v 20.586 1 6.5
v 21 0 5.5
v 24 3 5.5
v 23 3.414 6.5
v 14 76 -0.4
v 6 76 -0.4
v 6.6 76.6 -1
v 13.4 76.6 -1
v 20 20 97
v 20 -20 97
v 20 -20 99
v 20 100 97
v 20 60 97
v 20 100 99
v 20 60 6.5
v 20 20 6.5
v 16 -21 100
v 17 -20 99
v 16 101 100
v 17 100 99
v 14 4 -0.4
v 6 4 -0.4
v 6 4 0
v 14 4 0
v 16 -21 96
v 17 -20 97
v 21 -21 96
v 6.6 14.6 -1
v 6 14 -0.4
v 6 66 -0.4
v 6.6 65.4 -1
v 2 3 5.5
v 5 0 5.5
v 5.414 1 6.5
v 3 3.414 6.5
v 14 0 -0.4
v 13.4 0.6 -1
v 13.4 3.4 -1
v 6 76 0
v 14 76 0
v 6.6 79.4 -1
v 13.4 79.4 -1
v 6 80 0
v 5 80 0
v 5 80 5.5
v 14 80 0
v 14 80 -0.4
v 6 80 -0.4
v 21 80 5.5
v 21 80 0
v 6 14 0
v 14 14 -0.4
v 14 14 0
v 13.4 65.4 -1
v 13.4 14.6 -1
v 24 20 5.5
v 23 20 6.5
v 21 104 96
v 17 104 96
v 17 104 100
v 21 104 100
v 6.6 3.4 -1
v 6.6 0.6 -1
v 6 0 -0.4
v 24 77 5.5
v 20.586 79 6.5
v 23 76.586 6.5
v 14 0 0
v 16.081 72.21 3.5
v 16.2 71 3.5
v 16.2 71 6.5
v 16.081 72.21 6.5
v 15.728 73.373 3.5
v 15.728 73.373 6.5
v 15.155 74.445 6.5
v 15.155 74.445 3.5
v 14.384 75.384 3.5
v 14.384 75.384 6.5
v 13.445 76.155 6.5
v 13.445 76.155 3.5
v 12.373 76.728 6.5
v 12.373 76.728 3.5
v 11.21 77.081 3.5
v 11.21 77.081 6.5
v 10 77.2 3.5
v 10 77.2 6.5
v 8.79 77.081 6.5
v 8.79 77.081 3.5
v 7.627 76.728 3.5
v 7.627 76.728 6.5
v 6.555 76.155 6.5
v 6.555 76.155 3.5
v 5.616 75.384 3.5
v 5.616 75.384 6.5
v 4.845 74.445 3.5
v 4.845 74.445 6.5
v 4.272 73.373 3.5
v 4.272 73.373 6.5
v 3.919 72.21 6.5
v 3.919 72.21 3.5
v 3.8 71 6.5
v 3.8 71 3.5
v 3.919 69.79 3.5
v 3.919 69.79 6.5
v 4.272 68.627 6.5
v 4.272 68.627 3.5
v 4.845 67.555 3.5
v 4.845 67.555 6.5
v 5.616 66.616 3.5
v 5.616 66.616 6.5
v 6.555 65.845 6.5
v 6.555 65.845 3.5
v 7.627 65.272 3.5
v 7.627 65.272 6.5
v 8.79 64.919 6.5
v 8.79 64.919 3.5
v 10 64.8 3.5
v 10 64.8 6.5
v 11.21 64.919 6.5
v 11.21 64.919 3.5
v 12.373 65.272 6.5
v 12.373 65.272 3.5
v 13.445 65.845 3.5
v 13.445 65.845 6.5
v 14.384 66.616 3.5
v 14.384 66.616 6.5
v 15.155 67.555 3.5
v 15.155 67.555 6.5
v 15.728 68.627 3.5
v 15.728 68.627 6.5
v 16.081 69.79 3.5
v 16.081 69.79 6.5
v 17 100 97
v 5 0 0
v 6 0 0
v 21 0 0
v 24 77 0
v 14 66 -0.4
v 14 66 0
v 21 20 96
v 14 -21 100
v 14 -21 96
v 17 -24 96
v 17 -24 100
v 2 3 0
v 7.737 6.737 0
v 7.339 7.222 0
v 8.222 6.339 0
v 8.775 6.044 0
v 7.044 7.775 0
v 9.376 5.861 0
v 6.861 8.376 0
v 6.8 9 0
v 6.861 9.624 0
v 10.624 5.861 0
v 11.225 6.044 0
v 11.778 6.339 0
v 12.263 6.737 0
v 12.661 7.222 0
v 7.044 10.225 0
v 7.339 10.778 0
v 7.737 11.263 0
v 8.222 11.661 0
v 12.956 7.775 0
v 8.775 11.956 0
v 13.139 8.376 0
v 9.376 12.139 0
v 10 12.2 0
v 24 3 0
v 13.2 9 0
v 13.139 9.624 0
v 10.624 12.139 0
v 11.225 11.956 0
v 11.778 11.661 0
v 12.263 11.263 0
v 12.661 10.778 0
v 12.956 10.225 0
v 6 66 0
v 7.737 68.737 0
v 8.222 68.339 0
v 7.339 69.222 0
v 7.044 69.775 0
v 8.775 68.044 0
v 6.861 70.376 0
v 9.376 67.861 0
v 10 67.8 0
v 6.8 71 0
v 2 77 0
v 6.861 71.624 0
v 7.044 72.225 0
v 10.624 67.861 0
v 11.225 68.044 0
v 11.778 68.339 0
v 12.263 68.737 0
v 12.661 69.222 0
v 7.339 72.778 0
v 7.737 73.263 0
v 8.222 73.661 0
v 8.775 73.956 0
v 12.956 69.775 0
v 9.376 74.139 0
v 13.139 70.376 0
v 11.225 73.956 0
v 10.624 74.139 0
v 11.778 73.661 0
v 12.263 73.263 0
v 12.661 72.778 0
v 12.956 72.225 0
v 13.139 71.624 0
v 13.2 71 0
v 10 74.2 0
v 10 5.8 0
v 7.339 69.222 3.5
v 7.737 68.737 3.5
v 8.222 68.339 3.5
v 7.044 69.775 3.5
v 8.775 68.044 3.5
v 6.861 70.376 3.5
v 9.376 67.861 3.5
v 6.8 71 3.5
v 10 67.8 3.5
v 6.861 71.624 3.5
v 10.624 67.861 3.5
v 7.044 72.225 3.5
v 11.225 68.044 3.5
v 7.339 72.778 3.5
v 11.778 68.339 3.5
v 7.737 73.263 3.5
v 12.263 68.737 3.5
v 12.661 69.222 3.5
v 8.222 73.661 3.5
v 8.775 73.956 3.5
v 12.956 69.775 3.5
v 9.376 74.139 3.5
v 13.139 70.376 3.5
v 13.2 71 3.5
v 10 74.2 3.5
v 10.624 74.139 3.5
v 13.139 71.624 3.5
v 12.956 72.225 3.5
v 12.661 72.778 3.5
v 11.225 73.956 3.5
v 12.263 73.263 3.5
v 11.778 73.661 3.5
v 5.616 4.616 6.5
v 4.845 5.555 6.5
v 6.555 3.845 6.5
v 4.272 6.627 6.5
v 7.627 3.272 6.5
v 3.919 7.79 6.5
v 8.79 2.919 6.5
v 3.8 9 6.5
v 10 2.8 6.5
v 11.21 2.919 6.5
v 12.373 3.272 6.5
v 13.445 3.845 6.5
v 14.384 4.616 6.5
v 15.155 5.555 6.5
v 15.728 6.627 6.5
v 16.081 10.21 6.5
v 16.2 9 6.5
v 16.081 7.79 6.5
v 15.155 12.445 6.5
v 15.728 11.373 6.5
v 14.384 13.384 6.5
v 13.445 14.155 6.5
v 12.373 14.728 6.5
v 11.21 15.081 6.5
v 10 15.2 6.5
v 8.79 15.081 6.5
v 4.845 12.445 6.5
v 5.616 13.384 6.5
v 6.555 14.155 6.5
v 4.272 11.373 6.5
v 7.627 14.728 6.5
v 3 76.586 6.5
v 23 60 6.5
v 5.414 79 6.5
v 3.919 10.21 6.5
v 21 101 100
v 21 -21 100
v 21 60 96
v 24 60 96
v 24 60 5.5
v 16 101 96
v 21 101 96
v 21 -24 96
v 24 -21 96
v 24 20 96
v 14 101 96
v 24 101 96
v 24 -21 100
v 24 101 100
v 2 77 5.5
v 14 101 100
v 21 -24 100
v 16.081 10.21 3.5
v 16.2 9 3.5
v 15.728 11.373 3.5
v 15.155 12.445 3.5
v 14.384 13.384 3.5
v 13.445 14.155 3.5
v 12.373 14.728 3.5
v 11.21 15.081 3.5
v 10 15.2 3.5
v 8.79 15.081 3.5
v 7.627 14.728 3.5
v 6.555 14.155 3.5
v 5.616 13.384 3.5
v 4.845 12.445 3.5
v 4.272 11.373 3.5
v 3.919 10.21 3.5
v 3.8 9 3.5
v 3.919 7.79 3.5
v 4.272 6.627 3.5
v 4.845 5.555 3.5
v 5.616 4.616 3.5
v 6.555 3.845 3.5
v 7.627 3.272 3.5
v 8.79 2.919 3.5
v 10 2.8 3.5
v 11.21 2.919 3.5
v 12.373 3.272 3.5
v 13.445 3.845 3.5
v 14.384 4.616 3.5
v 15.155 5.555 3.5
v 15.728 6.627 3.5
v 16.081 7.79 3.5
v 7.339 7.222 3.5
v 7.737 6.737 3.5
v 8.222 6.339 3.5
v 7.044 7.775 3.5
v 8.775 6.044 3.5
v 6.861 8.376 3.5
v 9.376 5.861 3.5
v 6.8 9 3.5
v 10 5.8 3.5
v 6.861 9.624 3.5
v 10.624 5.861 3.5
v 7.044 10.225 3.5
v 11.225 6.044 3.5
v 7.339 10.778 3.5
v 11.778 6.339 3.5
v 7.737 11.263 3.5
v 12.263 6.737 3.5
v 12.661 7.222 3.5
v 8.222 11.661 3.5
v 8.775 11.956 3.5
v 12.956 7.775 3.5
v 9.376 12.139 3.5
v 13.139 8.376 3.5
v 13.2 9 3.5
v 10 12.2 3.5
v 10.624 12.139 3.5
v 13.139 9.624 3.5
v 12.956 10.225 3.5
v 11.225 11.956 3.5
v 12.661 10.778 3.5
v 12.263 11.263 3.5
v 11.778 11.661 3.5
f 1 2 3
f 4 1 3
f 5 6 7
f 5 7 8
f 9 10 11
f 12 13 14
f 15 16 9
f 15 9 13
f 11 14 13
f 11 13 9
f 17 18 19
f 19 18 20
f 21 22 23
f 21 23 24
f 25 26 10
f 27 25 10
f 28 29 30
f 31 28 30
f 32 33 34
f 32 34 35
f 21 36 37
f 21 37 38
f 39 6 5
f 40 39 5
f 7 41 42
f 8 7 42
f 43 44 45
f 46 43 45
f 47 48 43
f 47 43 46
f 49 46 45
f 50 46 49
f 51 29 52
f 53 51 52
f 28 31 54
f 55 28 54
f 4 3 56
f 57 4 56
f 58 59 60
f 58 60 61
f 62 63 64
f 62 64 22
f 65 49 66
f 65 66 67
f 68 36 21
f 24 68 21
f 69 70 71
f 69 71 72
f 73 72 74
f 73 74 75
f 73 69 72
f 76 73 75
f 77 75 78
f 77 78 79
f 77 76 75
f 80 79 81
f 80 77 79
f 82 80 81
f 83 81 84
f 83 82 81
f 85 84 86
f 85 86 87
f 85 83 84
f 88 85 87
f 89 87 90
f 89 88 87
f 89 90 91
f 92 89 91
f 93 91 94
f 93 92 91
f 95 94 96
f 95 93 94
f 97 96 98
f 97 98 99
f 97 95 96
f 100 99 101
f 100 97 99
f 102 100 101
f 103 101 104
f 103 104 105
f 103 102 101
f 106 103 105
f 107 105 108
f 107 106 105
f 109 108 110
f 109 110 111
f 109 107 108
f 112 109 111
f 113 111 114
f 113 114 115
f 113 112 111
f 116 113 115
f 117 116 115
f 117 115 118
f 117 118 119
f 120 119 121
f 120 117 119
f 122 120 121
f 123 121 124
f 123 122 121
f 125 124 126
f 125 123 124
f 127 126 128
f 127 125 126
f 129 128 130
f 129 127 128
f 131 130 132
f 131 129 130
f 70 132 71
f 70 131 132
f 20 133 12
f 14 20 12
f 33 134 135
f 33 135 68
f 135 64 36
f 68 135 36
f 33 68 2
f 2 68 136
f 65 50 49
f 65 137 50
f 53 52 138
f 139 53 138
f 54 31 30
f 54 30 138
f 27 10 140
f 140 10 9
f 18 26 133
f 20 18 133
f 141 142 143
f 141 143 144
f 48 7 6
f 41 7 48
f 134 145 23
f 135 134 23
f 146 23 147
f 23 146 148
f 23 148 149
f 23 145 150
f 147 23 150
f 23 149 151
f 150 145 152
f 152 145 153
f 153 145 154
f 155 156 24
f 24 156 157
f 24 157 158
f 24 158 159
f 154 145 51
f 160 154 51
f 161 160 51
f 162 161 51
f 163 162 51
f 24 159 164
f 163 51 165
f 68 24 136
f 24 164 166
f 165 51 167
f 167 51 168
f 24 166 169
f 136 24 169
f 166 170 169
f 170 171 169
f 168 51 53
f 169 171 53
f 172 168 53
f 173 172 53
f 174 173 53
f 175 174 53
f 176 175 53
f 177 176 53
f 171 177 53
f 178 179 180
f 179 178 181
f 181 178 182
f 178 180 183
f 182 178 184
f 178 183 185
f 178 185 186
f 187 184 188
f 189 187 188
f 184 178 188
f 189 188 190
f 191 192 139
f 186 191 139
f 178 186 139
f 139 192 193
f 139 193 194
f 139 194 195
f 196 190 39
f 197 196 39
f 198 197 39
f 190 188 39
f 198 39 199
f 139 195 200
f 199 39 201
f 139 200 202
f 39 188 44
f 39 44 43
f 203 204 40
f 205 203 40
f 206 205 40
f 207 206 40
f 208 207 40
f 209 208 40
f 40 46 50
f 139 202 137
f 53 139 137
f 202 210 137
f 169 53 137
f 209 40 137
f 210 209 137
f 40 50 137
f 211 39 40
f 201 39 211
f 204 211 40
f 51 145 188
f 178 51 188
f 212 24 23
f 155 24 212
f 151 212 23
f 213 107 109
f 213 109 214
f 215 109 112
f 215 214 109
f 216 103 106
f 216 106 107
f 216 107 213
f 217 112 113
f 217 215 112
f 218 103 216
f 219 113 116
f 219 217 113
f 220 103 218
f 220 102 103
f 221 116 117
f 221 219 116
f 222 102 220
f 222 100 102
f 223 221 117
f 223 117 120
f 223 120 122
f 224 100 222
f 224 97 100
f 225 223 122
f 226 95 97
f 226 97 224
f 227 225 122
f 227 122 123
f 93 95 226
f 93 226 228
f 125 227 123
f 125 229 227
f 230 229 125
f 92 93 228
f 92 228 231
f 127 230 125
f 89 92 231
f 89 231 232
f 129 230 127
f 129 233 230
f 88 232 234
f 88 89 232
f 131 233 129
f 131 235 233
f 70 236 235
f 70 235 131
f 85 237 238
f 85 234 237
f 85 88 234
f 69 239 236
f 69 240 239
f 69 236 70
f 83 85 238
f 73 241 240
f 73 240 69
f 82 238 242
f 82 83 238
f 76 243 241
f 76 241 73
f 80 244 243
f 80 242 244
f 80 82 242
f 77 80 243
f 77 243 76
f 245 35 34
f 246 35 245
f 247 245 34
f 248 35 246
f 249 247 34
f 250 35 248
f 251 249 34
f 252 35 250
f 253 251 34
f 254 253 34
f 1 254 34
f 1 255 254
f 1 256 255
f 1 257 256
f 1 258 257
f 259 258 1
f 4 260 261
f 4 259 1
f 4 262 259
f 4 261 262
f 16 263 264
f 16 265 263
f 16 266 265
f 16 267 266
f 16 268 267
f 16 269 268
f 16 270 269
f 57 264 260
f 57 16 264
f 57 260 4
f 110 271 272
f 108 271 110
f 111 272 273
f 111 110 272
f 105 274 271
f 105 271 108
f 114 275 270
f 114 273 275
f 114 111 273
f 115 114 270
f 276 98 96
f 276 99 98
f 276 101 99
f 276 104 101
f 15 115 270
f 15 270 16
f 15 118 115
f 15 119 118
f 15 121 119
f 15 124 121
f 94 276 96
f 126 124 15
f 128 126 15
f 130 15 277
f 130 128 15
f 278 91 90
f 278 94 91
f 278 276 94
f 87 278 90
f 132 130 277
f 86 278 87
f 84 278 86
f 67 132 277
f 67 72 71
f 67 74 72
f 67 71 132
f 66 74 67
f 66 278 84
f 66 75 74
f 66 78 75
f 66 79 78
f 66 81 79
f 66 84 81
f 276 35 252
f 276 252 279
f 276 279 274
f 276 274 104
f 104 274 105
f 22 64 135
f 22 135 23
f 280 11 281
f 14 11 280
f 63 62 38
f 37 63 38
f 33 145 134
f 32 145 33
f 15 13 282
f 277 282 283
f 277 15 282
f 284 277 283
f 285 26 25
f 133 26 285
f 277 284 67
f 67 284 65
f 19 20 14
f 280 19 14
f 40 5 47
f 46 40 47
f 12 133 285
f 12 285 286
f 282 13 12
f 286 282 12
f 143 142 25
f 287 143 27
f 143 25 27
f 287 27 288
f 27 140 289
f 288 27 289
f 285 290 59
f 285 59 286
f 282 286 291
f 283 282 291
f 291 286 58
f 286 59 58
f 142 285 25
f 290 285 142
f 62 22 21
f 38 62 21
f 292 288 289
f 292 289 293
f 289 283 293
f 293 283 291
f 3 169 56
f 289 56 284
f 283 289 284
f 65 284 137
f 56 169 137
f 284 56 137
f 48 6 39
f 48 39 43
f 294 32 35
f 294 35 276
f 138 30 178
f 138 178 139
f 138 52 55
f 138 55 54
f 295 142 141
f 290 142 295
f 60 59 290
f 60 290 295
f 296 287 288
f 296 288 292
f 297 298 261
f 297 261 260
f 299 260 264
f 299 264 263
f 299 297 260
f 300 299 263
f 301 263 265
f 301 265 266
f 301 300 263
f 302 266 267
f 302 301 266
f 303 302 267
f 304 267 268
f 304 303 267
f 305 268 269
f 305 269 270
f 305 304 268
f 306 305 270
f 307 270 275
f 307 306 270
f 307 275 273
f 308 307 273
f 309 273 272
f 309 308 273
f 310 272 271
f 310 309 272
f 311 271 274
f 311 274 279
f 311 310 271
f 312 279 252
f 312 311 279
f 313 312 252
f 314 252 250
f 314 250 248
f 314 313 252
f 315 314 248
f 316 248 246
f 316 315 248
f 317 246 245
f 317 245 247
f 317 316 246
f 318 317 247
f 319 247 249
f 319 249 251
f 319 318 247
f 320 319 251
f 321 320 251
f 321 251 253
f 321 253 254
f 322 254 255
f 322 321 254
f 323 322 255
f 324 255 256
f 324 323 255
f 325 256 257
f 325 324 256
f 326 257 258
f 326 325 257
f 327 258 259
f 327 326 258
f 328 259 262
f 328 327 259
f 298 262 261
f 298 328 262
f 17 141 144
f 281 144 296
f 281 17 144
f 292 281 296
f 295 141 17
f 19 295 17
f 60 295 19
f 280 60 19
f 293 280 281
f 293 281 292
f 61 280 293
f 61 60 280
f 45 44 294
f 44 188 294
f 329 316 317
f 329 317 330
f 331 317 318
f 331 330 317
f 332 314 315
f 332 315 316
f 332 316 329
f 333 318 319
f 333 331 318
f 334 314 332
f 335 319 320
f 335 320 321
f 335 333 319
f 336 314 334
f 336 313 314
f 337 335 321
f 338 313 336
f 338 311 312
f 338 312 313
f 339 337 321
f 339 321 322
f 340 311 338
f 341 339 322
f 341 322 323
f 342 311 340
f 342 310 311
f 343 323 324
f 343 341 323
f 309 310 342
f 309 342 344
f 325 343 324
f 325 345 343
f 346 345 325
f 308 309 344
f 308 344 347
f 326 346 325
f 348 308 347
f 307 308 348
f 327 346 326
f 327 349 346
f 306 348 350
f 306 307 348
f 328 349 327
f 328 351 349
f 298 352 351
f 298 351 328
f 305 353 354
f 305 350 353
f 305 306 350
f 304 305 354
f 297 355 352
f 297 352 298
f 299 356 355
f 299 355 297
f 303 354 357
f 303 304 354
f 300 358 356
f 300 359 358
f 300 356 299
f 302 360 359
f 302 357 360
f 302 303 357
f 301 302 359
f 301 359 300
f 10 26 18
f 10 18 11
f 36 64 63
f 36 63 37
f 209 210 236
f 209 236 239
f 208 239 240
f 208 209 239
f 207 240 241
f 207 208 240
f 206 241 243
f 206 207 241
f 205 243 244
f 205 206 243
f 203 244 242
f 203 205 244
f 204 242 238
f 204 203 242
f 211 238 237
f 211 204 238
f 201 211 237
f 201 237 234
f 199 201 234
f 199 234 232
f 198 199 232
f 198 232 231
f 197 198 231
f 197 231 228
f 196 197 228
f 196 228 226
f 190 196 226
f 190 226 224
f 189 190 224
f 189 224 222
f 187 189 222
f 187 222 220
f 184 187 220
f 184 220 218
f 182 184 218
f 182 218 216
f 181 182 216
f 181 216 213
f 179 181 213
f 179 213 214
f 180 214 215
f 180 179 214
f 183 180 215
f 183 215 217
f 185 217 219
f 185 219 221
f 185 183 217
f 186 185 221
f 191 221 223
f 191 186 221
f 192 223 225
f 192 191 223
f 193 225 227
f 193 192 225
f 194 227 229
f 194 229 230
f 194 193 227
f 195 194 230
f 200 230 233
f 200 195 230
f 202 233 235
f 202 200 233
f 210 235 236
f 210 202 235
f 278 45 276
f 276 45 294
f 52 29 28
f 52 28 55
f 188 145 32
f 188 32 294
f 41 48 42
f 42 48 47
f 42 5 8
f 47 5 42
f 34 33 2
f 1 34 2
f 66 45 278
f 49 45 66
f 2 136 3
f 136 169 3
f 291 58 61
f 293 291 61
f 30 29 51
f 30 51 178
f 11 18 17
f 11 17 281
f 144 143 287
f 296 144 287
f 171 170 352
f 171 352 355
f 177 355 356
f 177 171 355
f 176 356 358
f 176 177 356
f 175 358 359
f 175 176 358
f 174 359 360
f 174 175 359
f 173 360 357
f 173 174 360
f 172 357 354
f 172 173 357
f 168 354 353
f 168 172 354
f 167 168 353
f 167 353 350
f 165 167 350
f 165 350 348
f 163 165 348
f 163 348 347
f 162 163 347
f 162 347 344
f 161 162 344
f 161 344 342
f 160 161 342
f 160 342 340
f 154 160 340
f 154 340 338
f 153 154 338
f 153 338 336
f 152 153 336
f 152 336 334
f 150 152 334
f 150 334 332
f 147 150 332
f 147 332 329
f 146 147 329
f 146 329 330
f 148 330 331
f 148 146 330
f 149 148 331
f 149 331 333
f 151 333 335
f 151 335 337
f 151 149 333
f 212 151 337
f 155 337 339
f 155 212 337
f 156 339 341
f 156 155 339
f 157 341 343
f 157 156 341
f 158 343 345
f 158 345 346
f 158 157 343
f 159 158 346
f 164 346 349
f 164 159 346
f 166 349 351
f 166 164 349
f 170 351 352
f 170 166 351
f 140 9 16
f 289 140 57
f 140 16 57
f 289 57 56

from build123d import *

# Parameters (mm, degrees)
BOX006_W          = 3
BOX006_H          = 120
BOX006_DEPTH      = 4
BOX005_W          = 10
BOX005_H          = 128
BOX005_DEPTH      = 4
BOX004_W          = 4
BOX004_H          = 40
BOX004_DEPTH      = 100
CYLINDER010_R     = 6.2
CYLINDER010_DEPTH = 3
CYLINDER009_R     = 6.2
CYLINDER009_DEPTH = 3
CYLINDER001_R     = 3.2
CYLINDER001_DEPTH = 6.5
CYLINDER_R        = 3.2
CYLINDER_DEPTH    = 6.5
BOX_W             = 22
BOX_H             = 80
BOX_DEPTH         = 6.5
BOX002_W          = 8
BOX002_H          = 4
BOX002_DEPTH      = 1
BOX001_W          = 8
BOX001_H          = 4
BOX001_DEPTH      = 1
BOX003_W          = 8
BOX003_H          = 52
BOX003_DEPTH      = 1
CHAMFER_SIZE      = 3
CHAMFER001_SIZE   = 1
CHAMFER002_SIZE   = 1
CHAMFER003_SIZE   = 0.6


with BuildPart() as cube006:
    # Box006 → Box006 (new body)
    with BuildSketch(Plane(origin=(17, -20, 96), x_dir=(1, 0, 0), z_dir=(0, 0, 1))):
        with Locations((1.5, 60)):
            Rectangle(BOX006_W, BOX006_H)
    extrude(amount=BOX006_DEPTH)


with BuildPart() as cube005:
    # Box005 → Box005 (new body)
    with BuildSketch(Plane(origin=(14, -24, 96), x_dir=(1, 0, 0), z_dir=(0, 0, 1))):
        with Locations((5, 64)):
            Rectangle(BOX005_W, BOX005_H)
    extrude(amount=BOX005_DEPTH)


with BuildPart() as cut005:
    # Box004 → Box004 (new body)
    with BuildSketch(Plane(origin=(20, 20, 0), x_dir=(1, 0, 0), z_dir=(0, 0, 1))):
        with Locations((2, 20)):
            Rectangle(BOX004_W, BOX004_H)
    extrude(amount=BOX004_DEPTH)

    # Fusion012: union Cube005
    add(cube005.part)

    # Cut005: cut Cube006
    add(cube006.part, mode=Mode.SUBTRACT)


with BuildPart() as cylinder010:
    # Cylinder010 → Cylinder010 (new body)
    with BuildSketch(Plane(origin=(10, 71, 3.5), x_dir=(1, 0, 0), z_dir=(0, 0, 1))):
        Circle(CYLINDER010_R)
    extrude(amount=CYLINDER010_DEPTH)


with BuildPart() as cylinder009:
    # Cylinder009 → Cylinder009 (new body)
    with BuildSketch(Plane(origin=(10, 9, 3.5), x_dir=(1, 0, 0), z_dir=(0, 0, 1))):
        Circle(CYLINDER009_R)
    extrude(amount=CYLINDER009_DEPTH)


with BuildPart() as cylinder001:
    # Cylinder001 → Cylinder001 (new body)
    with BuildSketch(Plane(origin=(10, 71, -3), x_dir=(1, 0, 0), z_dir=(0, 0, 1))):
        Circle(CYLINDER001_R)
    extrude(amount=CYLINDER001_DEPTH)


with BuildPart() as cylinder:
    # Cylinder → Cylinder (new body)
    with BuildSketch(Plane(origin=(10, 9, -3), x_dir=(1, 0, 0), z_dir=(0, 0, 1))):
        Circle(CYLINDER_R)
    extrude(amount=CYLINDER_DEPTH)


with BuildPart() as cut004:
    # Box → Box (new body)
    with BuildSketch(Plane(origin=(2, 0, 0), x_dir=(1, 0, 0), z_dir=(0, 0, 1))):
        with Locations((11, 40)):
            Rectangle(BOX_W, BOX_H)
    extrude(amount=BOX_DEPTH)

    # Cut: cut Cylinder
    add(cylinder.part, mode=Mode.SUBTRACT)

    # Cut002: cut Cylinder001
    add(cylinder001.part, mode=Mode.SUBTRACT)

    # Cut003: cut Cylinder009
    add(cylinder009.part, mode=Mode.SUBTRACT)

    # Cut004: cut Cylinder010
    add(cylinder010.part, mode=Mode.SUBTRACT)


with BuildPart() as cube002:
    # Box002 → Box002 (new body)
    with BuildSketch(Plane(origin=(6, 76, -1), x_dir=(1, 0, 0), z_dir=(0, 0, 1))):
        with Locations((4, 2)):
            Rectangle(BOX002_W, BOX002_H)
    extrude(amount=BOX002_DEPTH)


with BuildPart() as fusion010:
    # Box001 → Box001 (new body)
    with BuildSketch(Plane(origin=(6, 0, -1), x_dir=(1, 0, 0), z_dir=(0, 0, 1))):
        with Locations((4, 2)):
            Rectangle(BOX001_W, BOX001_H)
    extrude(amount=BOX001_DEPTH)

    # Fusion010: union Cube002
    add(cube002.part)


with BuildPart() as chamfer003:
    # Box003 → Box003 (new body)
    with BuildSketch(Plane(origin=(6, 14, -1), x_dir=(1, 0, 0), z_dir=(0, 0, 1))):
        with Locations((4, 26)):
            Rectangle(BOX003_W, BOX003_H)
    extrude(amount=BOX003_DEPTH)

    # Fusion011: union Fusion010
    add(fusion010.part)

    # Fusion: union Cut004
    add(cut004.part)

    # Fusion013: union Cut005
    add(cut005.part)

    # Chamfer
    chamfer_edges = [chamfer003.edges().sort_by_distance(p)[0] for p in [
        (2, 0, 3.25),
        (2, 80, 3.25),
        (24, 0, 3.25),
        (24, 80, 3.25),
        (24, 104, 98),
        (24, -24, 98),
        (14, -24, 98),
        (14, 104, 98),
    ]]
    chamfer(chamfer_edges, length=CHAMFER_SIZE)

    # Chamfer001
    chamfer001_edges = [chamfer003.edges().sort_by_distance(p)[0] for p in [
        (20, 0, 96),
        (18.5, -20, 96),
        (17, 40, 96),
        (18.5, 100, 96),
        (20, 80, 96),
        (20, 80, 100),
        (20, 40, 100),
        (20, 0, 100),
        (18.5, 100, 100),
        (17, 40, 100),
        (18.5, -20, 100),
    ]]
    chamfer(chamfer001_edges, length=CHAMFER001_SIZE)

    # Chamfer002
    chamfer002_edges = [chamfer003.edges().sort_by_distance(p)[0] for p in [
        (13, 80, 6.5),
        (3.5, 78.5, 6.5),
        (2, 40, 6.5),
        (3.5, 1.5, 6.5),
        (13, 0, 6.5),
        (22.5, 1.5, 6.5),
        (24, 11.5, 6.5),
        (24, 68.5, 6.5),
        (22.5, 78.5, 6.5),
    ]]
    chamfer(chamfer002_edges, length=CHAMFER002_SIZE)

    # Chamfer003
    chamfer003_edges = [chamfer003.edges().sort_by_distance(p)[0] for p in [
        (6, 2, -1),
        (10, 4, -1),
        (14, 2, -1),
        (14, 78, -1),
        (10, 76, -1),
        (6, 78, -1),
        (6, 40, -1),
        (10, 66, -1),
        (14, 40, -1),
        (10, 14, -1),
        (10, 0, -1),
        (10, 80, -1),
    ]]
    chamfer(chamfer003_edges, length=CHAMFER003_SIZE)


solid = chamfer003.part
